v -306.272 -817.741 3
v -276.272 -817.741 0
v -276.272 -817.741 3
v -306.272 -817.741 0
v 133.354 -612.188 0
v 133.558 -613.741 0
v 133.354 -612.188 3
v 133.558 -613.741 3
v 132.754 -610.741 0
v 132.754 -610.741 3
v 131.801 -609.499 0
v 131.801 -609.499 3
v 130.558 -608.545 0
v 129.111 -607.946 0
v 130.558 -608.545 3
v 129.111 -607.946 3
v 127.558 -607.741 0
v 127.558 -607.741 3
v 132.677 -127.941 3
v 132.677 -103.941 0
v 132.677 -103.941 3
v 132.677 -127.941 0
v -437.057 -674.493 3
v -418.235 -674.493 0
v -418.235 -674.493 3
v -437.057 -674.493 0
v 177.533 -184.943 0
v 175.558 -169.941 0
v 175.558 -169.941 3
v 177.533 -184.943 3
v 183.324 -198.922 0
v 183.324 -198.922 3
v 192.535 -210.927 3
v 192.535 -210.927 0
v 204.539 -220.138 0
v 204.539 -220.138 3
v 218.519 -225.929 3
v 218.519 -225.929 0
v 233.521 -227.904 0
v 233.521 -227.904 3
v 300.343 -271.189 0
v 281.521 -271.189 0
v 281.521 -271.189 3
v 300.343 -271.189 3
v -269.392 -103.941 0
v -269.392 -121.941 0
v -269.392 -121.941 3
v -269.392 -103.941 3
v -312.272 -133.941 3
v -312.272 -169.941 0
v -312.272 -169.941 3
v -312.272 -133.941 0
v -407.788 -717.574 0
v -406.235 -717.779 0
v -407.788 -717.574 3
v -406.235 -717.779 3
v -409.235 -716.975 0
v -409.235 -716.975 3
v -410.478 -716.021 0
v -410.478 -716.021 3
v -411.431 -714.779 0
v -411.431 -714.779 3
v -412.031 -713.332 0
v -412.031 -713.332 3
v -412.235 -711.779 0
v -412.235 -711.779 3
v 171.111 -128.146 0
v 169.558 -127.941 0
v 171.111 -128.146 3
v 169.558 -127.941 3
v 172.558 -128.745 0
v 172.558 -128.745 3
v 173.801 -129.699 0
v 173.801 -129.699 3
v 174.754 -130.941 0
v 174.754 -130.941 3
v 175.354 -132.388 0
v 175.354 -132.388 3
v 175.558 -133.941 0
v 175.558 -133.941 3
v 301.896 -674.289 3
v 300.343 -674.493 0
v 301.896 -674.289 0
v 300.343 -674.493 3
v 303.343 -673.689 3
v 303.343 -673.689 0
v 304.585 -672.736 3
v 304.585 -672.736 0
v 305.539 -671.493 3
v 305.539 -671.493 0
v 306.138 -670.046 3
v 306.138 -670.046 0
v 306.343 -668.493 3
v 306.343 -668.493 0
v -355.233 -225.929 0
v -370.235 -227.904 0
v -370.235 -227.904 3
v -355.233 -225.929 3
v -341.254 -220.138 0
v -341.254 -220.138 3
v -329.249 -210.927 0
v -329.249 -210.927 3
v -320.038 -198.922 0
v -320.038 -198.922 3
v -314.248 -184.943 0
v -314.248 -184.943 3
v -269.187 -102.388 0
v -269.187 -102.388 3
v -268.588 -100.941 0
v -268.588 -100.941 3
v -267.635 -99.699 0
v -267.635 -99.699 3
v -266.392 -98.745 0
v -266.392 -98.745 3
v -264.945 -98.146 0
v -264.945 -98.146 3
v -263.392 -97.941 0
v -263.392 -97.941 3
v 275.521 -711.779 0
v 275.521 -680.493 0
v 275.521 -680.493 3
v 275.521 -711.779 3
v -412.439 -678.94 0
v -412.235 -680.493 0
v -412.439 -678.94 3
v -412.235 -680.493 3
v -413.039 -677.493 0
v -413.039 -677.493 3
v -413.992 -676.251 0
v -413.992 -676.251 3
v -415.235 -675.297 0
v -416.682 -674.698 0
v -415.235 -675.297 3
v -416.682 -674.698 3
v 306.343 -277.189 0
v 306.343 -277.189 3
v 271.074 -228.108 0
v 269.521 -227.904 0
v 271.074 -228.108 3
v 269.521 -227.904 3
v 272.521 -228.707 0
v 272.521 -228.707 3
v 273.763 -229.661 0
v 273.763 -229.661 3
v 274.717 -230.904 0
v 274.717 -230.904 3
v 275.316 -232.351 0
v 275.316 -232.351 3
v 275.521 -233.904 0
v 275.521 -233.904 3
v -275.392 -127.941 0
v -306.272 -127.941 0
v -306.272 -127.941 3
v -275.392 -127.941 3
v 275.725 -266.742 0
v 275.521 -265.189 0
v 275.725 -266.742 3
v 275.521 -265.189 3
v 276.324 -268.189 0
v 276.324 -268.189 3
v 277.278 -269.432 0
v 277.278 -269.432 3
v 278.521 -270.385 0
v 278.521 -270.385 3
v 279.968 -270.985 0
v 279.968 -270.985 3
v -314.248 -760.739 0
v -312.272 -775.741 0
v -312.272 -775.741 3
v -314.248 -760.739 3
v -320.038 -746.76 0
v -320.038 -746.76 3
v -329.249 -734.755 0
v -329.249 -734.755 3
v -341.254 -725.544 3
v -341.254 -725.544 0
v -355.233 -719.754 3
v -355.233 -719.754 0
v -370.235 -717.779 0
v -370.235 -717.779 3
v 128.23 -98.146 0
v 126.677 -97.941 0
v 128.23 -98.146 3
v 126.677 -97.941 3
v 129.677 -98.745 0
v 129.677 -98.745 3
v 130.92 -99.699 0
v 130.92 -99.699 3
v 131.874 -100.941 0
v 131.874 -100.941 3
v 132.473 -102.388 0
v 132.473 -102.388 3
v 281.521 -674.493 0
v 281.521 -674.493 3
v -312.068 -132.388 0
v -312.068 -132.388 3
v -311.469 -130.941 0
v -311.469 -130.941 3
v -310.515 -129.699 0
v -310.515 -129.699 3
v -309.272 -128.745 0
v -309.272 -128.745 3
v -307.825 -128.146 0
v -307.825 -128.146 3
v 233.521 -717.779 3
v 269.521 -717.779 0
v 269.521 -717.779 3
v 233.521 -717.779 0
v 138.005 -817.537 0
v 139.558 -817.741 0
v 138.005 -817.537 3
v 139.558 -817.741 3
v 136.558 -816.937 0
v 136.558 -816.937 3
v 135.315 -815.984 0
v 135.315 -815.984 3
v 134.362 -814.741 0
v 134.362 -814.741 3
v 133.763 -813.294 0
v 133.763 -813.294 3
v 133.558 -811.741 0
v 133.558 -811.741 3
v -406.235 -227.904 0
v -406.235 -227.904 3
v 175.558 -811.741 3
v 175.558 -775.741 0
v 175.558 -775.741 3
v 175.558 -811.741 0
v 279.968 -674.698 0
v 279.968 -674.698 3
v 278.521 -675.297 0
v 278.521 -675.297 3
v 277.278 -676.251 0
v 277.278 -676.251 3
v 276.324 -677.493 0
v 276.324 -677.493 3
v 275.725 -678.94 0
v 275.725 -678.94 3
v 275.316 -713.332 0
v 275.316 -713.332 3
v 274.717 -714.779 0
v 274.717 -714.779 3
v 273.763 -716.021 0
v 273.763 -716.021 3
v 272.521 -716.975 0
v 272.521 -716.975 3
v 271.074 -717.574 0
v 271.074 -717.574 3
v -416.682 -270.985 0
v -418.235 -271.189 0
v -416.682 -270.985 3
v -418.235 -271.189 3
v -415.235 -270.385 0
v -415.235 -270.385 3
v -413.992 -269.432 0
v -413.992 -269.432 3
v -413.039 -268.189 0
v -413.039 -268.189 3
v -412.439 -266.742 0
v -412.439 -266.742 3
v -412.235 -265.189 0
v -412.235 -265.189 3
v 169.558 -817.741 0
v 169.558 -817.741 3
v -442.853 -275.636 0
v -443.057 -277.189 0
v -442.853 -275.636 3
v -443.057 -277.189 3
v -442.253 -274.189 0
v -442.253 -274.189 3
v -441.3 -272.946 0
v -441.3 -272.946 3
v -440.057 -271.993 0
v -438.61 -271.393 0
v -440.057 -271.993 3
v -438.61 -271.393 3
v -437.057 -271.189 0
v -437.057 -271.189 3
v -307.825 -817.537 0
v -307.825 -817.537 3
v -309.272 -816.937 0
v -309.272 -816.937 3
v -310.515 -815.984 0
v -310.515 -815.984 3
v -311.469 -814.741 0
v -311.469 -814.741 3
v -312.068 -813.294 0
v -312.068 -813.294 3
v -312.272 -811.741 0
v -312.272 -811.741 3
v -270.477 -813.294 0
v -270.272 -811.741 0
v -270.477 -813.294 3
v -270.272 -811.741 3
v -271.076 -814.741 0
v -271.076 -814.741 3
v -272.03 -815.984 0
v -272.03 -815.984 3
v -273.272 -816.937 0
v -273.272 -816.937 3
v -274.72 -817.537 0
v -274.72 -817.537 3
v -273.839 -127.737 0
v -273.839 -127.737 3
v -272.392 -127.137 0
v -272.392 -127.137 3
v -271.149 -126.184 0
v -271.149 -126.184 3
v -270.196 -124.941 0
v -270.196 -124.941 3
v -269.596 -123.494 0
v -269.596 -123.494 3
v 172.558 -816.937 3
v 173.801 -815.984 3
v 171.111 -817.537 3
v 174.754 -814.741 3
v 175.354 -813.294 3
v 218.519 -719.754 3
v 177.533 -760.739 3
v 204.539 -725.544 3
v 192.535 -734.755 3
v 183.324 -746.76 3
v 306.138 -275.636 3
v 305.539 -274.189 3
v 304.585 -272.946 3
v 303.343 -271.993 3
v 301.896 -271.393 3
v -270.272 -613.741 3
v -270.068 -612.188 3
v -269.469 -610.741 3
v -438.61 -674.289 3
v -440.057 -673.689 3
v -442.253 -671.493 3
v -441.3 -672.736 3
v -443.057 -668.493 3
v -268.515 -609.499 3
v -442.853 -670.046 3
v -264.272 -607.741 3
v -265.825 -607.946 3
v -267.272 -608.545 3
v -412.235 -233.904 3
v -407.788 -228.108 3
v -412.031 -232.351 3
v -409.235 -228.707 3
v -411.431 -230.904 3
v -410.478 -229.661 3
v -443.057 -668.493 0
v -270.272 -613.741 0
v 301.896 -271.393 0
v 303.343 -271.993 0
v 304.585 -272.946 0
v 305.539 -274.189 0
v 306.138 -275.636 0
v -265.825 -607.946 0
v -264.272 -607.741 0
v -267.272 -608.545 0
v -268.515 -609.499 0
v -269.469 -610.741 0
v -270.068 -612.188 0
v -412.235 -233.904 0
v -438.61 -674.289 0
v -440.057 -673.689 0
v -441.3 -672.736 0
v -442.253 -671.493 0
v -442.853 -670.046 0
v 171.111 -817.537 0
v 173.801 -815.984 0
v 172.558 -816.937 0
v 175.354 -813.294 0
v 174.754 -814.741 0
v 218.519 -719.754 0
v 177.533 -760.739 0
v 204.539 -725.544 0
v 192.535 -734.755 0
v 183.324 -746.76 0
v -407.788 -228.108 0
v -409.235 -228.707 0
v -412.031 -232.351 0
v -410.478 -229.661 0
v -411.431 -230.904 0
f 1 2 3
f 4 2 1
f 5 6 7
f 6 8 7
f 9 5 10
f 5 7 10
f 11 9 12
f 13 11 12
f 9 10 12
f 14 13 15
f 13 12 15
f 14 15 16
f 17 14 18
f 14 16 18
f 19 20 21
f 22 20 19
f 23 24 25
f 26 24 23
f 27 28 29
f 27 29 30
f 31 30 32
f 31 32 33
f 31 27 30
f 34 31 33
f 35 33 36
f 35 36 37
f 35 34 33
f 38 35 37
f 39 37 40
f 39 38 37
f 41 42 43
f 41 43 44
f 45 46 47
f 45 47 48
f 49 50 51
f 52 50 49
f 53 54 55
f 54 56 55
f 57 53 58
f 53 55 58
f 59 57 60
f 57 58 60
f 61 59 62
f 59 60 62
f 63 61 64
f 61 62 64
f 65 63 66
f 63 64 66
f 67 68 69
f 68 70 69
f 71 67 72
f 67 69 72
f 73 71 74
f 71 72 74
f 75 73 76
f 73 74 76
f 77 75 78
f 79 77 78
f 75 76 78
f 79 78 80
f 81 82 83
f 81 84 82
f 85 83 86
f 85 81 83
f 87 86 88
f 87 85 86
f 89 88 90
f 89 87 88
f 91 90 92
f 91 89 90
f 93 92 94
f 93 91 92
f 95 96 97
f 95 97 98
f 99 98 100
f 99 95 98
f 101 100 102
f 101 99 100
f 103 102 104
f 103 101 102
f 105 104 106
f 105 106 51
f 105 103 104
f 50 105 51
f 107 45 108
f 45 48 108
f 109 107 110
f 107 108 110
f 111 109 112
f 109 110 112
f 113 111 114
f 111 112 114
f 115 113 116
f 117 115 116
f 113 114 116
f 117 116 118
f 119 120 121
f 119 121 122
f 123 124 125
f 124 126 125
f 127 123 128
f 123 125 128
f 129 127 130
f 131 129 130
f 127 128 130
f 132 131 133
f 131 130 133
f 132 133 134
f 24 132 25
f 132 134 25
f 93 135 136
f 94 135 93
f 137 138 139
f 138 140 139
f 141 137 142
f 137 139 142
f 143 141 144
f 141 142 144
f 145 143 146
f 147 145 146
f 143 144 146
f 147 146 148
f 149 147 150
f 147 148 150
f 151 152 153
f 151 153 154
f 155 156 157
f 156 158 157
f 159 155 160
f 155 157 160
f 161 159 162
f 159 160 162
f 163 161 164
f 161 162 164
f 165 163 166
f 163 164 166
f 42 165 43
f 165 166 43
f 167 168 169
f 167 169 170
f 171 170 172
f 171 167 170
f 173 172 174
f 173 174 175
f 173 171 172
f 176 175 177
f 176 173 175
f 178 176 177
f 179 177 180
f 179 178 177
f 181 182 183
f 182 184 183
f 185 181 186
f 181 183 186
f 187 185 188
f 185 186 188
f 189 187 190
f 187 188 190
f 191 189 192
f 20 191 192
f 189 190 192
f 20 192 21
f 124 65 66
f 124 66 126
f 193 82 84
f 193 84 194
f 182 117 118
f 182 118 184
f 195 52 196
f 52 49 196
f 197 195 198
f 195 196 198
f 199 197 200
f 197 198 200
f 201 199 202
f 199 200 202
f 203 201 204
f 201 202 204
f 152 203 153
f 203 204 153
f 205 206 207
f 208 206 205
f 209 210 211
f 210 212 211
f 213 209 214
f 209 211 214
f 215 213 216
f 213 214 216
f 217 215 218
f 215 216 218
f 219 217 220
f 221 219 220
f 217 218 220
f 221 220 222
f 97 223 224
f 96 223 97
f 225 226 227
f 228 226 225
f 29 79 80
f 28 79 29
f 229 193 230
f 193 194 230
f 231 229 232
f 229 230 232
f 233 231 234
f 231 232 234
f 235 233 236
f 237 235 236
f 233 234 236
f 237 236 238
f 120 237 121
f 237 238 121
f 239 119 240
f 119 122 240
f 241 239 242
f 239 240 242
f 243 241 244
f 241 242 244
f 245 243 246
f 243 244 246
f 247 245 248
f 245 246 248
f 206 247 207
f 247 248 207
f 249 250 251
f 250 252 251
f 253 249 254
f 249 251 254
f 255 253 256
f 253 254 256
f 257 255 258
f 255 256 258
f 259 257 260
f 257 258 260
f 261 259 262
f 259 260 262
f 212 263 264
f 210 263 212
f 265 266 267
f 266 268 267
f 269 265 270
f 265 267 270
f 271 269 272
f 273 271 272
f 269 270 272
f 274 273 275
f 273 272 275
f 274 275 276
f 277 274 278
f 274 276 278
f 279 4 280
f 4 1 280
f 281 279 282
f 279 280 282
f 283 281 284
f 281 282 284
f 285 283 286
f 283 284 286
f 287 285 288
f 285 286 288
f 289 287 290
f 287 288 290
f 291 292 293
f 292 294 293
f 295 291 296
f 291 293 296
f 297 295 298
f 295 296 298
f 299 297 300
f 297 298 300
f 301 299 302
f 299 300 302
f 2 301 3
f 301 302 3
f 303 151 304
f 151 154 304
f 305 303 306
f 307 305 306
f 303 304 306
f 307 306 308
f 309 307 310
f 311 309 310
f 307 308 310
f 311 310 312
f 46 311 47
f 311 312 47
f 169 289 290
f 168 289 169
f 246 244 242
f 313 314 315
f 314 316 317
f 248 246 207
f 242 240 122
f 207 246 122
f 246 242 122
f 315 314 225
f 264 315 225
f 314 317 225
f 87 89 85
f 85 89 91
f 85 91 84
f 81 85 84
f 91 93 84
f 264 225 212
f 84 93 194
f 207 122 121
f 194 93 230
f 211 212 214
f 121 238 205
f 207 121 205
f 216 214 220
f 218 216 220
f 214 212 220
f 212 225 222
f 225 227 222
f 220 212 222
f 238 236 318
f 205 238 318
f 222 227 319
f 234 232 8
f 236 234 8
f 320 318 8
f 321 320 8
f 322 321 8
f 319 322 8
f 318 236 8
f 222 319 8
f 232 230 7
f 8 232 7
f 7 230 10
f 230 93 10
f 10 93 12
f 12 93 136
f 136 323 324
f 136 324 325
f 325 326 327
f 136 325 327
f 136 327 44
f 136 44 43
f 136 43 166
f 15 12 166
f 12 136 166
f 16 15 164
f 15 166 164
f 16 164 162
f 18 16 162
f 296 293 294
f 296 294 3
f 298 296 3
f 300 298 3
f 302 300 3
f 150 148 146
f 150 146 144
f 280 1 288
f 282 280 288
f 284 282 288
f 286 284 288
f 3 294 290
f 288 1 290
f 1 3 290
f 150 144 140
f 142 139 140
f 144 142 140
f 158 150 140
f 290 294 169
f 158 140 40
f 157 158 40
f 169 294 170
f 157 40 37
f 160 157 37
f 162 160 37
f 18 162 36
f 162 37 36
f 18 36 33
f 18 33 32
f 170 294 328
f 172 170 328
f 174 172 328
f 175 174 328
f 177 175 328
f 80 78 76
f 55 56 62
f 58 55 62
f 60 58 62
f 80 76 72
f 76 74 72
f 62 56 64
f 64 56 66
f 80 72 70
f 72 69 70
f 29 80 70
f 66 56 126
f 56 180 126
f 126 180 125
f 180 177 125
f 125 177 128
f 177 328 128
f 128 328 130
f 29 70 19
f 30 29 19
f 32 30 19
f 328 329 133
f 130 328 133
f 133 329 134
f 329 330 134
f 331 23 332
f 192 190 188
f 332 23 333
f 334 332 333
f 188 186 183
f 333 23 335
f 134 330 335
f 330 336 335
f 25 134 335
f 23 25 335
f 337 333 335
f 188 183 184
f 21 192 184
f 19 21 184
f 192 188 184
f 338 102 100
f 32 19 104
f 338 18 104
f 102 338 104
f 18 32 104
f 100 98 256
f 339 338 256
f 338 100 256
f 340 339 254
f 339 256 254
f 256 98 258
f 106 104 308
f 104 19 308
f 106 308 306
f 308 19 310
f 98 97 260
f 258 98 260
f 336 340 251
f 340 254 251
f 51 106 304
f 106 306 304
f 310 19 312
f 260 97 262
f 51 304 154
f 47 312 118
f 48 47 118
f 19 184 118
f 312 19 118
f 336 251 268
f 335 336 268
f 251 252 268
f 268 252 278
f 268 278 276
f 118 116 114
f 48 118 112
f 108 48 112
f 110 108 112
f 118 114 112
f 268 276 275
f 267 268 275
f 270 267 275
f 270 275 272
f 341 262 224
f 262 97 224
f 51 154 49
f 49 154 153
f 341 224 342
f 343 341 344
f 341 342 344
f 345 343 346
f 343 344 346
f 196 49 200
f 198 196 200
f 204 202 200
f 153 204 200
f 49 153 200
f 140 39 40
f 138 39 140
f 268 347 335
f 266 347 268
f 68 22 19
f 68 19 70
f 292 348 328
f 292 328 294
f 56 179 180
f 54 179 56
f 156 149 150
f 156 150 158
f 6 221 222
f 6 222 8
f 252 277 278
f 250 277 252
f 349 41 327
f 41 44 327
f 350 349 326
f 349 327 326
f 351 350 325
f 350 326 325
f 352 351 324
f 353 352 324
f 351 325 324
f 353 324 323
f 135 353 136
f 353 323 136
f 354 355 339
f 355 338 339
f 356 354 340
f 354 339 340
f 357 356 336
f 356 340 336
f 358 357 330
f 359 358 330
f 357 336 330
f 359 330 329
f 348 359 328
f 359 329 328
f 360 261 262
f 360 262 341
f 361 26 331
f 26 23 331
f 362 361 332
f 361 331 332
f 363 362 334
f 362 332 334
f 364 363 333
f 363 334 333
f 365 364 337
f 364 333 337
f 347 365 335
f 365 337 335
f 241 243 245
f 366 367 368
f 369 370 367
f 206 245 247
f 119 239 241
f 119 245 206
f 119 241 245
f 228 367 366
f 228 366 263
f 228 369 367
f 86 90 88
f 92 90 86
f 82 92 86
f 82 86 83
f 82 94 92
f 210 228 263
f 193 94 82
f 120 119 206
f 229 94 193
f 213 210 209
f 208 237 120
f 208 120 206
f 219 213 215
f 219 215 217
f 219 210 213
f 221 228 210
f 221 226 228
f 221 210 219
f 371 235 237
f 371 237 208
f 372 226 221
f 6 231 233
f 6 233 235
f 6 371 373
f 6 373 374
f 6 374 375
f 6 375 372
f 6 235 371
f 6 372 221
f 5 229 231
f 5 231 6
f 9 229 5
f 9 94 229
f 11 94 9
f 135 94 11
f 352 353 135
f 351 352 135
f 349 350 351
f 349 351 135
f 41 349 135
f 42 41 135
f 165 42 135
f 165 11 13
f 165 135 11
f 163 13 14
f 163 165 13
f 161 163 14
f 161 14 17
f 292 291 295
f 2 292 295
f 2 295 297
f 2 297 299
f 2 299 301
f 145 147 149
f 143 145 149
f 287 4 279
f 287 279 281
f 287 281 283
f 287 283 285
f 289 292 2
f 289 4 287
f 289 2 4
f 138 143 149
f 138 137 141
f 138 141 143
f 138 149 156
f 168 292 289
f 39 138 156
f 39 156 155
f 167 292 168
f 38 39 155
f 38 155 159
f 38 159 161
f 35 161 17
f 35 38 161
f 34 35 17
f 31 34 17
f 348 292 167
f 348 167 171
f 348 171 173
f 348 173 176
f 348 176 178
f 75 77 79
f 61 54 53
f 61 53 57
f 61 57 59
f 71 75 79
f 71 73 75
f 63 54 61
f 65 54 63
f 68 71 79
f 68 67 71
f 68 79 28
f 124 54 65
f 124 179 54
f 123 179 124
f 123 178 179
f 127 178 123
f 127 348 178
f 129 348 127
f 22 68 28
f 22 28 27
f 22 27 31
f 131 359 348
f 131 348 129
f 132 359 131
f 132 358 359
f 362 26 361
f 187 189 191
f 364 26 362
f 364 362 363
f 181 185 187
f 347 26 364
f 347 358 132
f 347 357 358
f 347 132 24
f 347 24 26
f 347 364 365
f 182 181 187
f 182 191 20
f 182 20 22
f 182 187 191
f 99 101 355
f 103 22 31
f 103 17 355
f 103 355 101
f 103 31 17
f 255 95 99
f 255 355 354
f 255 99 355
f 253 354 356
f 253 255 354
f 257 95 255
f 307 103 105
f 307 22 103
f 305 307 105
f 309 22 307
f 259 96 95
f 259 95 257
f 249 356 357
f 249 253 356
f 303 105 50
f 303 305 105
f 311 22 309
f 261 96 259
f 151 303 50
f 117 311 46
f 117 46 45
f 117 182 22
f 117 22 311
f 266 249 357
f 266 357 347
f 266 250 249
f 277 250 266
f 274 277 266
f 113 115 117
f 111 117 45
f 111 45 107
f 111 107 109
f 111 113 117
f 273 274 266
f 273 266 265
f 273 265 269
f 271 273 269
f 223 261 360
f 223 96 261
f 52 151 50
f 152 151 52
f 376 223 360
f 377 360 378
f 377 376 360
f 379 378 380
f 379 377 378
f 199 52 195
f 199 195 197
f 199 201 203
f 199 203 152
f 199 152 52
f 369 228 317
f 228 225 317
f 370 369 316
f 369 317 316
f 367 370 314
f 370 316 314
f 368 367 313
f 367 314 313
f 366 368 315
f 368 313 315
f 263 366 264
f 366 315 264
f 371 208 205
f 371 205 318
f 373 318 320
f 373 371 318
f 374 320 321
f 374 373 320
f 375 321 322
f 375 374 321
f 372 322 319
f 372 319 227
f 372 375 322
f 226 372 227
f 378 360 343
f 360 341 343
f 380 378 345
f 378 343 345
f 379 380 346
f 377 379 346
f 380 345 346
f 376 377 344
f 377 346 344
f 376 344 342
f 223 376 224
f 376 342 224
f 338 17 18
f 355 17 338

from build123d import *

# Parameters (mm, degrees)
RESSALTO_EXTRUS_O1_DEPTH = 3
FILETE1_R                = 6


with BuildPart() as part:
    # Esboço1 → Ressalto-extrusão1 (new body)
    with BuildSketch(Plane.XY):
        with BuildLine():
            Line((306.342806047, -674.493319609), (275.520600999, -674.493319609))
            Line((275.520600999, -674.493319609), (275.520600999, -717.778646353))
            Line((275.520600999, -717.778646353), (233.520600999, -717.778646353))
            ThreePointArc((233.520600999, -717.778646353), (192.534924195, -734.755469548), (175.558100999, -775.741146353))
            Line((175.558100999, -775.741146353), (175.558100999, -817.741146353))
            Line((175.558100999, -817.741146353), (133.558100999, -817.741146353))
            Line((133.558100999, -817.741146353), (133.558100999, -607.741146353))
            Line((133.558100999, -607.741146353), (-270.272488906, -607.741146353))
            Line((-270.272488906, -607.741146353), (-270.272488906, -817.741146353))
            Line((-270.272488906, -817.741146353), (-312.272488906, -817.741146353))
            Line((-312.272488906, -817.741146353), (-312.272488906, -775.741146353))
            ThreePointArc((-312.272488906, -775.741146353), (-329.249312101, -734.755469548), (-370.234988906, -717.778646353))
            Line((-370.234988906, -717.778646353), (-412.234988906, -717.778646353))
            Line((-412.234988906, -717.778646353), (-412.234988906, -674.493319609))
            Line((-412.234988906, -674.493319609), (-443.057193953, -674.493319609))
            Line((-443.057193953, -674.493319609), (-443.057193953, -271.188973097))
            Line((-443.057193953, -271.188973097), (-412.234988906, -271.188973097))
            Line((-412.234988906, -271.188973097), (-412.234988906, -227.903646353))
            Line((-412.234988906, -227.903646353), (-370.234988906, -227.903646353))
            ThreePointArc((-370.234988906, -227.903646353), (-329.249312101, -210.926823158), (-312.272488906, -169.941146353))
            Line((-312.272488906, -169.941146353), (-312.272488906, -127.941146353))
            Line((-312.272488906, -127.941146353), (-270.272488906, -127.941146353))
            Line((-270.272488906, -127.941146353), (-269.391871615, -127.941146353))
            Line((-269.391871615, -127.941146353), (-269.391871615, -97.941146353))
            Line((-269.391871615, -97.941146353), (132.677483708, -97.941146353))
            Line((132.677483708, -97.941146353), (132.677483708, -127.941146353))
            Line((132.677483708, -127.941146353), (133.558100999, -127.941146353))
            Line((133.558100999, -127.941146353), (175.558100999, -127.941146353))
            Line((175.558100999, -127.941146353), (175.558100999, -169.941146353))
            ThreePointArc((175.558100999, -169.941146353), (192.534924195, -210.926823158), (233.520600999, -227.903646353))
            Line((233.520600999, -227.903646353), (275.520600999, -227.903646353))
            Line((275.520600999, -227.903646353), (275.520600999, -271.188973097))
            Line((275.520600999, -271.188973097), (306.342806047, -271.188973097))
            Line((306.342806047, -271.188973097), (306.342806047, -674.493319609))
        make_face()
    extrude(amount=RESSALTO_EXTRUS_O1_DEPTH)

    # Filete1
    filete1_edges = [part.edges().sort_by_distance(p)[0] for p in [
        (306.342806047, -674.493319609, 1.5),
        (275.520600999, -674.493319609, 1.5),
        (275.520600999, -717.778646353, 1.5),
        (175.558100999, -817.741146353, 1.5),
        (133.558100999, -817.741146353, 1.5),
        (133.558100999, -607.741146353, 1.5),
        (-270.272488906, -607.741146353, 1.5),
        (-270.272488906, -817.741146353, 1.5),
        (-312.272488906, -817.741146353, 1.5),
        (-412.234988906, -717.778646353, 1.5),
        (-412.234988906, -674.493319609, 1.5),
        (-443.057193953, -674.493319609, 1.5),
        (-443.057193953, -271.188973097, 1.5),
        (-412.234988906, -271.188973097, 1.5),
        (-412.234988906, -227.903646353, 1.5),
        (-312.272488906, -127.941146353, 1.5),
        (-269.391871615, -127.941146353, 1.5),
        (-269.391871615, -97.941146353, 1.5),
        (132.677483708, -97.941146353, 1.5),
        (175.558100999, -127.941146353, 1.5),
        (275.520600999, -227.903646353, 1.5),
        (275.520600999, -271.188973097, 1.5),
        (306.342806047, -271.188973097, 1.5),
    ]]
    fillet(filete1_edges, radius=FILETE1_R)


solid = part.part
